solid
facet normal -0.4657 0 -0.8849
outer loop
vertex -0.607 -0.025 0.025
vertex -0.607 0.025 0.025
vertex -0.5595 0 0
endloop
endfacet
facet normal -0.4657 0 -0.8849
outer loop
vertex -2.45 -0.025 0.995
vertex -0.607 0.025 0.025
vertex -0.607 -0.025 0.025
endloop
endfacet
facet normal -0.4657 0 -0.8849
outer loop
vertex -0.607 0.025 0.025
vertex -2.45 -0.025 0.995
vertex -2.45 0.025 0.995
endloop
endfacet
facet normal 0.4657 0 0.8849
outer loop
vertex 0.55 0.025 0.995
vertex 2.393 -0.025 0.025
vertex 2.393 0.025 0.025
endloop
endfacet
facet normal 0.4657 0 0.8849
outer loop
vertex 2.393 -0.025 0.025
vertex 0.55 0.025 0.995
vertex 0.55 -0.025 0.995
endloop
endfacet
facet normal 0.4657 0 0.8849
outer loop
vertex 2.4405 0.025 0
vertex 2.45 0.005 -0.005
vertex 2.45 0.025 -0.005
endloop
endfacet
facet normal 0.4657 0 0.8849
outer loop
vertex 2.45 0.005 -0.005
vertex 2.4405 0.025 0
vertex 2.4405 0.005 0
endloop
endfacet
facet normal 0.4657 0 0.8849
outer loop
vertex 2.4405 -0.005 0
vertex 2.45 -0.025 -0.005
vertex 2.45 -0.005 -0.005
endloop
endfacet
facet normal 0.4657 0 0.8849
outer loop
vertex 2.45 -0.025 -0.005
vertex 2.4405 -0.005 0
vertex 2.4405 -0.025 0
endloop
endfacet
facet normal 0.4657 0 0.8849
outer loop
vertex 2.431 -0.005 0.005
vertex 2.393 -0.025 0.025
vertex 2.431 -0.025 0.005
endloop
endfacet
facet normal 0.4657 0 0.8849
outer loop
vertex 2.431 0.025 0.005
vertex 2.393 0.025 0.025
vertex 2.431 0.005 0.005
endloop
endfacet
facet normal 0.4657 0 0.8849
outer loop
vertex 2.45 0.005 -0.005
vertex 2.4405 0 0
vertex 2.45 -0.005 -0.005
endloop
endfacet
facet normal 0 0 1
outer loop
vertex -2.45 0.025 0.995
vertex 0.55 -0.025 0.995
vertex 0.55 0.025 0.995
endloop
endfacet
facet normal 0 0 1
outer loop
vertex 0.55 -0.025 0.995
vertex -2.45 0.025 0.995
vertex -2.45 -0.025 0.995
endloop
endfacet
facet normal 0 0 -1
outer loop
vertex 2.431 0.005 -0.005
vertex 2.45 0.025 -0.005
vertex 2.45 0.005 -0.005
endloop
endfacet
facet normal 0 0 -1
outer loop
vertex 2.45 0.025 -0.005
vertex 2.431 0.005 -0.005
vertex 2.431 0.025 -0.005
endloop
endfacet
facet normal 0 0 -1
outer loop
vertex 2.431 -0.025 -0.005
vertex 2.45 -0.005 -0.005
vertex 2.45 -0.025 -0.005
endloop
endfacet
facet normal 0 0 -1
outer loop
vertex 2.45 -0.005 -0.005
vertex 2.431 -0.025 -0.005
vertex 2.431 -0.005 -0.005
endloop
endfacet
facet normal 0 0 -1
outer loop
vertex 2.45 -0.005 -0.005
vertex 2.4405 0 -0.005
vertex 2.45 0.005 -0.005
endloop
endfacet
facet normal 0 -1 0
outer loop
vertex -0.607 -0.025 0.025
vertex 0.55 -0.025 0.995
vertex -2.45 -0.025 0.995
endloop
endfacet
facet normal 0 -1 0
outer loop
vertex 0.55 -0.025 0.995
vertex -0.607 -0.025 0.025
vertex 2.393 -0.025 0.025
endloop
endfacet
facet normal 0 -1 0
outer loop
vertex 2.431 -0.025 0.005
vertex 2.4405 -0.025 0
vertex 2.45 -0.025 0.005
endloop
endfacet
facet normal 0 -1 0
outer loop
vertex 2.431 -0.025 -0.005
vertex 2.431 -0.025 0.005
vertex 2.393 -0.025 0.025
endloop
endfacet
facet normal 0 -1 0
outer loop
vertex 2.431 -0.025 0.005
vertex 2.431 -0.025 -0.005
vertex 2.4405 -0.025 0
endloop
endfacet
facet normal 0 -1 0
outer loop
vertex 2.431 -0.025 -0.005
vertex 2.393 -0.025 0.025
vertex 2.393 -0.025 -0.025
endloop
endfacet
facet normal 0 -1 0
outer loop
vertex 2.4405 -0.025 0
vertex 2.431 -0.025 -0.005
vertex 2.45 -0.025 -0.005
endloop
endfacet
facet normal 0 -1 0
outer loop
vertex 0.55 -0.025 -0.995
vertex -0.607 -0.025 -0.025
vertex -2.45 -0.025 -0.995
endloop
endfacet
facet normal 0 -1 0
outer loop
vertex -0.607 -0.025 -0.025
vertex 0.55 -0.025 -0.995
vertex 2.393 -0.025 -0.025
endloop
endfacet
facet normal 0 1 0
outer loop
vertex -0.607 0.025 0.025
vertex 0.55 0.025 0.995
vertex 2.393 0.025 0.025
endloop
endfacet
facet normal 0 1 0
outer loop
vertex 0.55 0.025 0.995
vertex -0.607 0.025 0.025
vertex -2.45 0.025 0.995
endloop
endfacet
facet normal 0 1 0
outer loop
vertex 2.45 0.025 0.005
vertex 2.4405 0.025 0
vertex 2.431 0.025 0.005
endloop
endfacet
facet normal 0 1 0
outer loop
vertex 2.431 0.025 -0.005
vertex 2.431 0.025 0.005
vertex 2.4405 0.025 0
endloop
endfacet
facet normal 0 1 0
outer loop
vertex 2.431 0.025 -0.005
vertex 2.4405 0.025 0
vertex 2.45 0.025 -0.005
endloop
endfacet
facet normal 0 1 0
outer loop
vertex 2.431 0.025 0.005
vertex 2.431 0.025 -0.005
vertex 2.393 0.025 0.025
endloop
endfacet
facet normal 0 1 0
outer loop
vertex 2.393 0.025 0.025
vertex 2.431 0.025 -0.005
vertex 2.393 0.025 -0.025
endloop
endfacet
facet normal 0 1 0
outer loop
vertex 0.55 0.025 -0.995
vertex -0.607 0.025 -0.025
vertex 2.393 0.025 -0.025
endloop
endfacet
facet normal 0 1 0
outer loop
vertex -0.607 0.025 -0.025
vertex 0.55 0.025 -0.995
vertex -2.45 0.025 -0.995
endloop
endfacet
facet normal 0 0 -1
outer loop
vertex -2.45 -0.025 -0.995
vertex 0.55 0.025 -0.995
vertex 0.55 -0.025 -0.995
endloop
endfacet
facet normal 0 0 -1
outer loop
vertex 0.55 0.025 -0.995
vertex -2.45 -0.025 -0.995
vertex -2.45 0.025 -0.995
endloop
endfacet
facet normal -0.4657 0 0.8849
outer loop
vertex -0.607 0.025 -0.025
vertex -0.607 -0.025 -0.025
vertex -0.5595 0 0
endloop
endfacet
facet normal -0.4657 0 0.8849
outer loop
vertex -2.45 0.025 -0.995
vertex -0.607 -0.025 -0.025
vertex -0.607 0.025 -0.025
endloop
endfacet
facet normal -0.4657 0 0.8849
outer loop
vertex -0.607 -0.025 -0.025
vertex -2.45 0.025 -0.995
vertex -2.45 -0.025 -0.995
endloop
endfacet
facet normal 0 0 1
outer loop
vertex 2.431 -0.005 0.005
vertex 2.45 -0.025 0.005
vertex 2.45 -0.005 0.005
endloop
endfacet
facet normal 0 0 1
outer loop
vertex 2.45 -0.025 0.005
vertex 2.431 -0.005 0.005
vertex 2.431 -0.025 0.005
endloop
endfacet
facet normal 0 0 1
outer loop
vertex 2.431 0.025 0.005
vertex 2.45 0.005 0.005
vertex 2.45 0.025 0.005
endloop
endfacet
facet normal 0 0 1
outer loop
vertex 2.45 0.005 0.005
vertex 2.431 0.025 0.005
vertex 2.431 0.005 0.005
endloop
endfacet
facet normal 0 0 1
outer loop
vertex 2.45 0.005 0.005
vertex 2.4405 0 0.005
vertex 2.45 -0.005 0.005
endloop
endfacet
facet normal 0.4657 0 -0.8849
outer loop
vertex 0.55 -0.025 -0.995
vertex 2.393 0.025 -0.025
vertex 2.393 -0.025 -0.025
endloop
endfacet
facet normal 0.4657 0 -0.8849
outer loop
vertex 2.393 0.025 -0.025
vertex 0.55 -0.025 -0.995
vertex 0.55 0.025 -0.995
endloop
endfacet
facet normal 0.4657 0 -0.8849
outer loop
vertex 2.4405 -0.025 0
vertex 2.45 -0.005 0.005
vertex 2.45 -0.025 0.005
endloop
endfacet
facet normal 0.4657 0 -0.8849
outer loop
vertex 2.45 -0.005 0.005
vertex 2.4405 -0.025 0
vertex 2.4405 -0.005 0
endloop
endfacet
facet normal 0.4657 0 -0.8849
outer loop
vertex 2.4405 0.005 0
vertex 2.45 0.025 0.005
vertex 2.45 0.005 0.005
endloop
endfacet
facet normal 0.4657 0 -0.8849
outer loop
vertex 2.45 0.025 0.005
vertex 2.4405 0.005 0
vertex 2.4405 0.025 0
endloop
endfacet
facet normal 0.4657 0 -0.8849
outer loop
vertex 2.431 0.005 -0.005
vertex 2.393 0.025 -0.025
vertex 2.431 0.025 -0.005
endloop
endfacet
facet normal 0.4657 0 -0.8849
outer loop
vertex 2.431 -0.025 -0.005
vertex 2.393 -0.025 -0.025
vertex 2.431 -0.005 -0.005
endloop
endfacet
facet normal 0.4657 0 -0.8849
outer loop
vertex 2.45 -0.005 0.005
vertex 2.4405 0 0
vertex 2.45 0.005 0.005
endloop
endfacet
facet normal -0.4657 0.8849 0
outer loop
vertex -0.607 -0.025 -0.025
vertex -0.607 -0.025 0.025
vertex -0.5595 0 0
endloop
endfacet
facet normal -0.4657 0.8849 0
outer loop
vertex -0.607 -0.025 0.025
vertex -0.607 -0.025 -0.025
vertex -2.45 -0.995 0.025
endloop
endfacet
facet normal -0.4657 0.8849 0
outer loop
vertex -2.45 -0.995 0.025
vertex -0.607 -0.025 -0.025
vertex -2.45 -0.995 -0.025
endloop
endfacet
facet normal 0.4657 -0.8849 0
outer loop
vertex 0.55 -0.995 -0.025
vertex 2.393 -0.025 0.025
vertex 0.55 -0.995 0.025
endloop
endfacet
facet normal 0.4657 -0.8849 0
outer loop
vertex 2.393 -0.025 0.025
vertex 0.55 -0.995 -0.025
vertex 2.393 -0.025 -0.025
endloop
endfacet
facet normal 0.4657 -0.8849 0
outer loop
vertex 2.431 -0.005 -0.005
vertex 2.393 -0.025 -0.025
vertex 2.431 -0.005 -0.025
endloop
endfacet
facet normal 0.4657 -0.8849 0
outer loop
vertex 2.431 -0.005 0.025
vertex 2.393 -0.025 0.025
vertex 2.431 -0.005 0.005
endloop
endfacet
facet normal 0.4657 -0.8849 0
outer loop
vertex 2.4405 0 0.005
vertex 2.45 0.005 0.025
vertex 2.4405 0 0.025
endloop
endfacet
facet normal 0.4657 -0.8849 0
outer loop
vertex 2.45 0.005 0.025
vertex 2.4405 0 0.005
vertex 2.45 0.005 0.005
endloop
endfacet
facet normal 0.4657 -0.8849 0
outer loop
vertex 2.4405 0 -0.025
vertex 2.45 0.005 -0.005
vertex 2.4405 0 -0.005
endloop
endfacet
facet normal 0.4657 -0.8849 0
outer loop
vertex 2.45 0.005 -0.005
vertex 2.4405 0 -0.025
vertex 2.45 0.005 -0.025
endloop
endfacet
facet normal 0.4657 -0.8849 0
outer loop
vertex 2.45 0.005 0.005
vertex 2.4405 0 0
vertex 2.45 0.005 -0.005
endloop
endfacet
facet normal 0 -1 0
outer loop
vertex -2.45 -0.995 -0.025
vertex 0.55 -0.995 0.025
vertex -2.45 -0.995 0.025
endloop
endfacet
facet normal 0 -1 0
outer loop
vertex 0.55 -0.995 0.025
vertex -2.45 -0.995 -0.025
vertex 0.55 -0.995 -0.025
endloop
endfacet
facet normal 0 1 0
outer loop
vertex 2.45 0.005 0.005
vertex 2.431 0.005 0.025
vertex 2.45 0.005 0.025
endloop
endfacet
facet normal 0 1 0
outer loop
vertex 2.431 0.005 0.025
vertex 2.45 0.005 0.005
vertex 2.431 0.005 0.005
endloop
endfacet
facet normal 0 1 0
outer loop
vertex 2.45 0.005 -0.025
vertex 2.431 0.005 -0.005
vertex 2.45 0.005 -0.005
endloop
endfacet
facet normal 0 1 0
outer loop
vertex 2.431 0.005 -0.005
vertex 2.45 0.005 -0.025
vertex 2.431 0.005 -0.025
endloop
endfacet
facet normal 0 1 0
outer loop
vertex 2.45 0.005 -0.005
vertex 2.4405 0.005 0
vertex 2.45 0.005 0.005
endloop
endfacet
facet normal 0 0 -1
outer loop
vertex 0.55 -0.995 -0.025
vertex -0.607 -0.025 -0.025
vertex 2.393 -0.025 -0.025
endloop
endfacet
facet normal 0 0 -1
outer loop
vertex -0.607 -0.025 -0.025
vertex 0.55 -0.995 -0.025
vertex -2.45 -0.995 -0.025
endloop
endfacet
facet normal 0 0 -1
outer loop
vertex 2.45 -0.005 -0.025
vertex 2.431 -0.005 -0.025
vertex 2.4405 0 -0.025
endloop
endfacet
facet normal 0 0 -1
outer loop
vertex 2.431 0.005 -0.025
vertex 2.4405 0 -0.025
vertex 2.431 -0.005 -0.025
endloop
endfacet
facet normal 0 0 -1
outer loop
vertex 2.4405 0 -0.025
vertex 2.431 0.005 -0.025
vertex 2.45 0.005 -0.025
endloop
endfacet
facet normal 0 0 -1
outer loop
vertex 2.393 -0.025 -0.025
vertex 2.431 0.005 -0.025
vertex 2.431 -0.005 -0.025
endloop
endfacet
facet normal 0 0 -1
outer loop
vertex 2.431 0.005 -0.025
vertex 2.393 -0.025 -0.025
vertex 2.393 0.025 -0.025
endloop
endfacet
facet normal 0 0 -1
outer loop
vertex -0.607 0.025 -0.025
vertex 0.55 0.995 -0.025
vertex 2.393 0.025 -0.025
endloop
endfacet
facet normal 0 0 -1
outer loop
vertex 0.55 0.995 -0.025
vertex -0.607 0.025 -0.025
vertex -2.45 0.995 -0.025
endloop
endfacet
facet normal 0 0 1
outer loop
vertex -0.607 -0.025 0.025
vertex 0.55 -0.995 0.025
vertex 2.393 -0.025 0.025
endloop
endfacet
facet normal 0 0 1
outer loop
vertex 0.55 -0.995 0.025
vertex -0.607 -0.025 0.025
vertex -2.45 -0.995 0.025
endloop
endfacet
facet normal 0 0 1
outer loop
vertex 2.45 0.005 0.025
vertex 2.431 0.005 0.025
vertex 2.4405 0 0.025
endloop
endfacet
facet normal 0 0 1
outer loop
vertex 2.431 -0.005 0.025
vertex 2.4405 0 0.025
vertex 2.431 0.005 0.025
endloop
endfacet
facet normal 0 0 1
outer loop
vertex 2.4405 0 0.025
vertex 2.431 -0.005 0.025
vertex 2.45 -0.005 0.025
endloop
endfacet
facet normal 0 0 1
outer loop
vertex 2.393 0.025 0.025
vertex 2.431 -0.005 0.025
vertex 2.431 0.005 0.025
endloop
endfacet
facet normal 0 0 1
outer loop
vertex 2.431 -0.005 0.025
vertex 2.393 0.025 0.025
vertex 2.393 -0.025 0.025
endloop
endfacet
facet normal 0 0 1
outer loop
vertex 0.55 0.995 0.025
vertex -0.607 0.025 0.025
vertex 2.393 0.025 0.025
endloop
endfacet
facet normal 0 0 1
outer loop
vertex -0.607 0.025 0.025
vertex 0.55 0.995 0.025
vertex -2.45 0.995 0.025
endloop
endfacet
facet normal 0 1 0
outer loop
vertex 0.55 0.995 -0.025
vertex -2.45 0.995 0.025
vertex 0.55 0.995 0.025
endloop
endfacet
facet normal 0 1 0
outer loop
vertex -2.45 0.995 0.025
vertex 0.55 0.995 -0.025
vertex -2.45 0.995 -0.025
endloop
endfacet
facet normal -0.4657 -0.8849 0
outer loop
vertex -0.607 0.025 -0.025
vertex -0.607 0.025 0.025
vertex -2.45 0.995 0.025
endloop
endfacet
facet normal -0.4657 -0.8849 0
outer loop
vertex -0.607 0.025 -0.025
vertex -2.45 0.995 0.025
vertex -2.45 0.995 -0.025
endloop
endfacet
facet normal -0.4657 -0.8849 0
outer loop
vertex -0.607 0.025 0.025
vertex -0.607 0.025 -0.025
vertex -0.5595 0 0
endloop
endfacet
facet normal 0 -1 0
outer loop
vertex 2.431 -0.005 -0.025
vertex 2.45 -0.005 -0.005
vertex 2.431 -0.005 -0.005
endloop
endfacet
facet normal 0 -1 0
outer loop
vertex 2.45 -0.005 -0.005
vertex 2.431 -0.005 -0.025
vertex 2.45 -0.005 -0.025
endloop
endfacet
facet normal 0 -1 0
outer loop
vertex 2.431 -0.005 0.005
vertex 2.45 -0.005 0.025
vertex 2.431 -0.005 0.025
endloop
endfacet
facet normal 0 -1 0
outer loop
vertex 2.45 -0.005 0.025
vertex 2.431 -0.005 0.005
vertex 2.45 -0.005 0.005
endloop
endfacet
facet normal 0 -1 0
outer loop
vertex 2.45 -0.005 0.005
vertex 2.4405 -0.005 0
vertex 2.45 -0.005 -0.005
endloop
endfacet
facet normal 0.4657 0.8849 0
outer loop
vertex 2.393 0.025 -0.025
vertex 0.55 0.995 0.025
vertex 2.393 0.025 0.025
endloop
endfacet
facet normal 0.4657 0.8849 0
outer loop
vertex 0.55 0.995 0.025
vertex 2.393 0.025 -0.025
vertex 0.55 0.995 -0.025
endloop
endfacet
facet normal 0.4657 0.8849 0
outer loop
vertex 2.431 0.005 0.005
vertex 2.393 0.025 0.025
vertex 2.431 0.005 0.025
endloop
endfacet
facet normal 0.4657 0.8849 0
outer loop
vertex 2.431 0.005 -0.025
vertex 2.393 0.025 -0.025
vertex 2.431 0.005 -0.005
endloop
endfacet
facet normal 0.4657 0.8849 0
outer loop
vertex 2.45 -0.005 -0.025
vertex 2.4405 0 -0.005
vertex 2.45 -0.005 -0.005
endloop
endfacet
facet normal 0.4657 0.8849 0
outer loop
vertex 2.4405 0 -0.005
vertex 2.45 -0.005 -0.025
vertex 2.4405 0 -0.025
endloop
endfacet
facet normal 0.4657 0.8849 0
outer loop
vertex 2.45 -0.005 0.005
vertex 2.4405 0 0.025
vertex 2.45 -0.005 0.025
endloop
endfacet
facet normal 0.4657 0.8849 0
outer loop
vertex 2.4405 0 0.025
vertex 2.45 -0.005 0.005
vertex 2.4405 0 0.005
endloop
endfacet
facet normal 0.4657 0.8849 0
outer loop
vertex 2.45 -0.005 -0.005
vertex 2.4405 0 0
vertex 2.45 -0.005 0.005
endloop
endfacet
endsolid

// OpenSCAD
module arrow_feather()
{
	M = [
		[ 1, 0, -1.9, 0   ],
		[ 0, 1,  0.0, 0   ],  // The "0.7" is the skew value; pushed along the y axis
		[ 0, 0,  1.0, 0   ],
		[ 0, 0,  0.0, 1   ]
	];
	translate(v = [0, 0, 0.495])
		multmatrix(M)
			cube(size = [3, 0.05, 1], center = true);
}

module arrow_feather_pair()
{
	union() {
		arrow_feather();
		rotate(v = [1, 0, 0], a = 180)
			arrow_feather();
	}
}

module arrow_feather_set()
{
	difference() {
		union() {
			arrow_feather_pair();
			rotate(v = [1, 0, 0], a = 90)
				arrow_feather_pair();
		}
		translate(v = [3.85, 0, 0])
			cube(size = [1, 1, 1], center = true);
	}
}

arrow_feather_set();
